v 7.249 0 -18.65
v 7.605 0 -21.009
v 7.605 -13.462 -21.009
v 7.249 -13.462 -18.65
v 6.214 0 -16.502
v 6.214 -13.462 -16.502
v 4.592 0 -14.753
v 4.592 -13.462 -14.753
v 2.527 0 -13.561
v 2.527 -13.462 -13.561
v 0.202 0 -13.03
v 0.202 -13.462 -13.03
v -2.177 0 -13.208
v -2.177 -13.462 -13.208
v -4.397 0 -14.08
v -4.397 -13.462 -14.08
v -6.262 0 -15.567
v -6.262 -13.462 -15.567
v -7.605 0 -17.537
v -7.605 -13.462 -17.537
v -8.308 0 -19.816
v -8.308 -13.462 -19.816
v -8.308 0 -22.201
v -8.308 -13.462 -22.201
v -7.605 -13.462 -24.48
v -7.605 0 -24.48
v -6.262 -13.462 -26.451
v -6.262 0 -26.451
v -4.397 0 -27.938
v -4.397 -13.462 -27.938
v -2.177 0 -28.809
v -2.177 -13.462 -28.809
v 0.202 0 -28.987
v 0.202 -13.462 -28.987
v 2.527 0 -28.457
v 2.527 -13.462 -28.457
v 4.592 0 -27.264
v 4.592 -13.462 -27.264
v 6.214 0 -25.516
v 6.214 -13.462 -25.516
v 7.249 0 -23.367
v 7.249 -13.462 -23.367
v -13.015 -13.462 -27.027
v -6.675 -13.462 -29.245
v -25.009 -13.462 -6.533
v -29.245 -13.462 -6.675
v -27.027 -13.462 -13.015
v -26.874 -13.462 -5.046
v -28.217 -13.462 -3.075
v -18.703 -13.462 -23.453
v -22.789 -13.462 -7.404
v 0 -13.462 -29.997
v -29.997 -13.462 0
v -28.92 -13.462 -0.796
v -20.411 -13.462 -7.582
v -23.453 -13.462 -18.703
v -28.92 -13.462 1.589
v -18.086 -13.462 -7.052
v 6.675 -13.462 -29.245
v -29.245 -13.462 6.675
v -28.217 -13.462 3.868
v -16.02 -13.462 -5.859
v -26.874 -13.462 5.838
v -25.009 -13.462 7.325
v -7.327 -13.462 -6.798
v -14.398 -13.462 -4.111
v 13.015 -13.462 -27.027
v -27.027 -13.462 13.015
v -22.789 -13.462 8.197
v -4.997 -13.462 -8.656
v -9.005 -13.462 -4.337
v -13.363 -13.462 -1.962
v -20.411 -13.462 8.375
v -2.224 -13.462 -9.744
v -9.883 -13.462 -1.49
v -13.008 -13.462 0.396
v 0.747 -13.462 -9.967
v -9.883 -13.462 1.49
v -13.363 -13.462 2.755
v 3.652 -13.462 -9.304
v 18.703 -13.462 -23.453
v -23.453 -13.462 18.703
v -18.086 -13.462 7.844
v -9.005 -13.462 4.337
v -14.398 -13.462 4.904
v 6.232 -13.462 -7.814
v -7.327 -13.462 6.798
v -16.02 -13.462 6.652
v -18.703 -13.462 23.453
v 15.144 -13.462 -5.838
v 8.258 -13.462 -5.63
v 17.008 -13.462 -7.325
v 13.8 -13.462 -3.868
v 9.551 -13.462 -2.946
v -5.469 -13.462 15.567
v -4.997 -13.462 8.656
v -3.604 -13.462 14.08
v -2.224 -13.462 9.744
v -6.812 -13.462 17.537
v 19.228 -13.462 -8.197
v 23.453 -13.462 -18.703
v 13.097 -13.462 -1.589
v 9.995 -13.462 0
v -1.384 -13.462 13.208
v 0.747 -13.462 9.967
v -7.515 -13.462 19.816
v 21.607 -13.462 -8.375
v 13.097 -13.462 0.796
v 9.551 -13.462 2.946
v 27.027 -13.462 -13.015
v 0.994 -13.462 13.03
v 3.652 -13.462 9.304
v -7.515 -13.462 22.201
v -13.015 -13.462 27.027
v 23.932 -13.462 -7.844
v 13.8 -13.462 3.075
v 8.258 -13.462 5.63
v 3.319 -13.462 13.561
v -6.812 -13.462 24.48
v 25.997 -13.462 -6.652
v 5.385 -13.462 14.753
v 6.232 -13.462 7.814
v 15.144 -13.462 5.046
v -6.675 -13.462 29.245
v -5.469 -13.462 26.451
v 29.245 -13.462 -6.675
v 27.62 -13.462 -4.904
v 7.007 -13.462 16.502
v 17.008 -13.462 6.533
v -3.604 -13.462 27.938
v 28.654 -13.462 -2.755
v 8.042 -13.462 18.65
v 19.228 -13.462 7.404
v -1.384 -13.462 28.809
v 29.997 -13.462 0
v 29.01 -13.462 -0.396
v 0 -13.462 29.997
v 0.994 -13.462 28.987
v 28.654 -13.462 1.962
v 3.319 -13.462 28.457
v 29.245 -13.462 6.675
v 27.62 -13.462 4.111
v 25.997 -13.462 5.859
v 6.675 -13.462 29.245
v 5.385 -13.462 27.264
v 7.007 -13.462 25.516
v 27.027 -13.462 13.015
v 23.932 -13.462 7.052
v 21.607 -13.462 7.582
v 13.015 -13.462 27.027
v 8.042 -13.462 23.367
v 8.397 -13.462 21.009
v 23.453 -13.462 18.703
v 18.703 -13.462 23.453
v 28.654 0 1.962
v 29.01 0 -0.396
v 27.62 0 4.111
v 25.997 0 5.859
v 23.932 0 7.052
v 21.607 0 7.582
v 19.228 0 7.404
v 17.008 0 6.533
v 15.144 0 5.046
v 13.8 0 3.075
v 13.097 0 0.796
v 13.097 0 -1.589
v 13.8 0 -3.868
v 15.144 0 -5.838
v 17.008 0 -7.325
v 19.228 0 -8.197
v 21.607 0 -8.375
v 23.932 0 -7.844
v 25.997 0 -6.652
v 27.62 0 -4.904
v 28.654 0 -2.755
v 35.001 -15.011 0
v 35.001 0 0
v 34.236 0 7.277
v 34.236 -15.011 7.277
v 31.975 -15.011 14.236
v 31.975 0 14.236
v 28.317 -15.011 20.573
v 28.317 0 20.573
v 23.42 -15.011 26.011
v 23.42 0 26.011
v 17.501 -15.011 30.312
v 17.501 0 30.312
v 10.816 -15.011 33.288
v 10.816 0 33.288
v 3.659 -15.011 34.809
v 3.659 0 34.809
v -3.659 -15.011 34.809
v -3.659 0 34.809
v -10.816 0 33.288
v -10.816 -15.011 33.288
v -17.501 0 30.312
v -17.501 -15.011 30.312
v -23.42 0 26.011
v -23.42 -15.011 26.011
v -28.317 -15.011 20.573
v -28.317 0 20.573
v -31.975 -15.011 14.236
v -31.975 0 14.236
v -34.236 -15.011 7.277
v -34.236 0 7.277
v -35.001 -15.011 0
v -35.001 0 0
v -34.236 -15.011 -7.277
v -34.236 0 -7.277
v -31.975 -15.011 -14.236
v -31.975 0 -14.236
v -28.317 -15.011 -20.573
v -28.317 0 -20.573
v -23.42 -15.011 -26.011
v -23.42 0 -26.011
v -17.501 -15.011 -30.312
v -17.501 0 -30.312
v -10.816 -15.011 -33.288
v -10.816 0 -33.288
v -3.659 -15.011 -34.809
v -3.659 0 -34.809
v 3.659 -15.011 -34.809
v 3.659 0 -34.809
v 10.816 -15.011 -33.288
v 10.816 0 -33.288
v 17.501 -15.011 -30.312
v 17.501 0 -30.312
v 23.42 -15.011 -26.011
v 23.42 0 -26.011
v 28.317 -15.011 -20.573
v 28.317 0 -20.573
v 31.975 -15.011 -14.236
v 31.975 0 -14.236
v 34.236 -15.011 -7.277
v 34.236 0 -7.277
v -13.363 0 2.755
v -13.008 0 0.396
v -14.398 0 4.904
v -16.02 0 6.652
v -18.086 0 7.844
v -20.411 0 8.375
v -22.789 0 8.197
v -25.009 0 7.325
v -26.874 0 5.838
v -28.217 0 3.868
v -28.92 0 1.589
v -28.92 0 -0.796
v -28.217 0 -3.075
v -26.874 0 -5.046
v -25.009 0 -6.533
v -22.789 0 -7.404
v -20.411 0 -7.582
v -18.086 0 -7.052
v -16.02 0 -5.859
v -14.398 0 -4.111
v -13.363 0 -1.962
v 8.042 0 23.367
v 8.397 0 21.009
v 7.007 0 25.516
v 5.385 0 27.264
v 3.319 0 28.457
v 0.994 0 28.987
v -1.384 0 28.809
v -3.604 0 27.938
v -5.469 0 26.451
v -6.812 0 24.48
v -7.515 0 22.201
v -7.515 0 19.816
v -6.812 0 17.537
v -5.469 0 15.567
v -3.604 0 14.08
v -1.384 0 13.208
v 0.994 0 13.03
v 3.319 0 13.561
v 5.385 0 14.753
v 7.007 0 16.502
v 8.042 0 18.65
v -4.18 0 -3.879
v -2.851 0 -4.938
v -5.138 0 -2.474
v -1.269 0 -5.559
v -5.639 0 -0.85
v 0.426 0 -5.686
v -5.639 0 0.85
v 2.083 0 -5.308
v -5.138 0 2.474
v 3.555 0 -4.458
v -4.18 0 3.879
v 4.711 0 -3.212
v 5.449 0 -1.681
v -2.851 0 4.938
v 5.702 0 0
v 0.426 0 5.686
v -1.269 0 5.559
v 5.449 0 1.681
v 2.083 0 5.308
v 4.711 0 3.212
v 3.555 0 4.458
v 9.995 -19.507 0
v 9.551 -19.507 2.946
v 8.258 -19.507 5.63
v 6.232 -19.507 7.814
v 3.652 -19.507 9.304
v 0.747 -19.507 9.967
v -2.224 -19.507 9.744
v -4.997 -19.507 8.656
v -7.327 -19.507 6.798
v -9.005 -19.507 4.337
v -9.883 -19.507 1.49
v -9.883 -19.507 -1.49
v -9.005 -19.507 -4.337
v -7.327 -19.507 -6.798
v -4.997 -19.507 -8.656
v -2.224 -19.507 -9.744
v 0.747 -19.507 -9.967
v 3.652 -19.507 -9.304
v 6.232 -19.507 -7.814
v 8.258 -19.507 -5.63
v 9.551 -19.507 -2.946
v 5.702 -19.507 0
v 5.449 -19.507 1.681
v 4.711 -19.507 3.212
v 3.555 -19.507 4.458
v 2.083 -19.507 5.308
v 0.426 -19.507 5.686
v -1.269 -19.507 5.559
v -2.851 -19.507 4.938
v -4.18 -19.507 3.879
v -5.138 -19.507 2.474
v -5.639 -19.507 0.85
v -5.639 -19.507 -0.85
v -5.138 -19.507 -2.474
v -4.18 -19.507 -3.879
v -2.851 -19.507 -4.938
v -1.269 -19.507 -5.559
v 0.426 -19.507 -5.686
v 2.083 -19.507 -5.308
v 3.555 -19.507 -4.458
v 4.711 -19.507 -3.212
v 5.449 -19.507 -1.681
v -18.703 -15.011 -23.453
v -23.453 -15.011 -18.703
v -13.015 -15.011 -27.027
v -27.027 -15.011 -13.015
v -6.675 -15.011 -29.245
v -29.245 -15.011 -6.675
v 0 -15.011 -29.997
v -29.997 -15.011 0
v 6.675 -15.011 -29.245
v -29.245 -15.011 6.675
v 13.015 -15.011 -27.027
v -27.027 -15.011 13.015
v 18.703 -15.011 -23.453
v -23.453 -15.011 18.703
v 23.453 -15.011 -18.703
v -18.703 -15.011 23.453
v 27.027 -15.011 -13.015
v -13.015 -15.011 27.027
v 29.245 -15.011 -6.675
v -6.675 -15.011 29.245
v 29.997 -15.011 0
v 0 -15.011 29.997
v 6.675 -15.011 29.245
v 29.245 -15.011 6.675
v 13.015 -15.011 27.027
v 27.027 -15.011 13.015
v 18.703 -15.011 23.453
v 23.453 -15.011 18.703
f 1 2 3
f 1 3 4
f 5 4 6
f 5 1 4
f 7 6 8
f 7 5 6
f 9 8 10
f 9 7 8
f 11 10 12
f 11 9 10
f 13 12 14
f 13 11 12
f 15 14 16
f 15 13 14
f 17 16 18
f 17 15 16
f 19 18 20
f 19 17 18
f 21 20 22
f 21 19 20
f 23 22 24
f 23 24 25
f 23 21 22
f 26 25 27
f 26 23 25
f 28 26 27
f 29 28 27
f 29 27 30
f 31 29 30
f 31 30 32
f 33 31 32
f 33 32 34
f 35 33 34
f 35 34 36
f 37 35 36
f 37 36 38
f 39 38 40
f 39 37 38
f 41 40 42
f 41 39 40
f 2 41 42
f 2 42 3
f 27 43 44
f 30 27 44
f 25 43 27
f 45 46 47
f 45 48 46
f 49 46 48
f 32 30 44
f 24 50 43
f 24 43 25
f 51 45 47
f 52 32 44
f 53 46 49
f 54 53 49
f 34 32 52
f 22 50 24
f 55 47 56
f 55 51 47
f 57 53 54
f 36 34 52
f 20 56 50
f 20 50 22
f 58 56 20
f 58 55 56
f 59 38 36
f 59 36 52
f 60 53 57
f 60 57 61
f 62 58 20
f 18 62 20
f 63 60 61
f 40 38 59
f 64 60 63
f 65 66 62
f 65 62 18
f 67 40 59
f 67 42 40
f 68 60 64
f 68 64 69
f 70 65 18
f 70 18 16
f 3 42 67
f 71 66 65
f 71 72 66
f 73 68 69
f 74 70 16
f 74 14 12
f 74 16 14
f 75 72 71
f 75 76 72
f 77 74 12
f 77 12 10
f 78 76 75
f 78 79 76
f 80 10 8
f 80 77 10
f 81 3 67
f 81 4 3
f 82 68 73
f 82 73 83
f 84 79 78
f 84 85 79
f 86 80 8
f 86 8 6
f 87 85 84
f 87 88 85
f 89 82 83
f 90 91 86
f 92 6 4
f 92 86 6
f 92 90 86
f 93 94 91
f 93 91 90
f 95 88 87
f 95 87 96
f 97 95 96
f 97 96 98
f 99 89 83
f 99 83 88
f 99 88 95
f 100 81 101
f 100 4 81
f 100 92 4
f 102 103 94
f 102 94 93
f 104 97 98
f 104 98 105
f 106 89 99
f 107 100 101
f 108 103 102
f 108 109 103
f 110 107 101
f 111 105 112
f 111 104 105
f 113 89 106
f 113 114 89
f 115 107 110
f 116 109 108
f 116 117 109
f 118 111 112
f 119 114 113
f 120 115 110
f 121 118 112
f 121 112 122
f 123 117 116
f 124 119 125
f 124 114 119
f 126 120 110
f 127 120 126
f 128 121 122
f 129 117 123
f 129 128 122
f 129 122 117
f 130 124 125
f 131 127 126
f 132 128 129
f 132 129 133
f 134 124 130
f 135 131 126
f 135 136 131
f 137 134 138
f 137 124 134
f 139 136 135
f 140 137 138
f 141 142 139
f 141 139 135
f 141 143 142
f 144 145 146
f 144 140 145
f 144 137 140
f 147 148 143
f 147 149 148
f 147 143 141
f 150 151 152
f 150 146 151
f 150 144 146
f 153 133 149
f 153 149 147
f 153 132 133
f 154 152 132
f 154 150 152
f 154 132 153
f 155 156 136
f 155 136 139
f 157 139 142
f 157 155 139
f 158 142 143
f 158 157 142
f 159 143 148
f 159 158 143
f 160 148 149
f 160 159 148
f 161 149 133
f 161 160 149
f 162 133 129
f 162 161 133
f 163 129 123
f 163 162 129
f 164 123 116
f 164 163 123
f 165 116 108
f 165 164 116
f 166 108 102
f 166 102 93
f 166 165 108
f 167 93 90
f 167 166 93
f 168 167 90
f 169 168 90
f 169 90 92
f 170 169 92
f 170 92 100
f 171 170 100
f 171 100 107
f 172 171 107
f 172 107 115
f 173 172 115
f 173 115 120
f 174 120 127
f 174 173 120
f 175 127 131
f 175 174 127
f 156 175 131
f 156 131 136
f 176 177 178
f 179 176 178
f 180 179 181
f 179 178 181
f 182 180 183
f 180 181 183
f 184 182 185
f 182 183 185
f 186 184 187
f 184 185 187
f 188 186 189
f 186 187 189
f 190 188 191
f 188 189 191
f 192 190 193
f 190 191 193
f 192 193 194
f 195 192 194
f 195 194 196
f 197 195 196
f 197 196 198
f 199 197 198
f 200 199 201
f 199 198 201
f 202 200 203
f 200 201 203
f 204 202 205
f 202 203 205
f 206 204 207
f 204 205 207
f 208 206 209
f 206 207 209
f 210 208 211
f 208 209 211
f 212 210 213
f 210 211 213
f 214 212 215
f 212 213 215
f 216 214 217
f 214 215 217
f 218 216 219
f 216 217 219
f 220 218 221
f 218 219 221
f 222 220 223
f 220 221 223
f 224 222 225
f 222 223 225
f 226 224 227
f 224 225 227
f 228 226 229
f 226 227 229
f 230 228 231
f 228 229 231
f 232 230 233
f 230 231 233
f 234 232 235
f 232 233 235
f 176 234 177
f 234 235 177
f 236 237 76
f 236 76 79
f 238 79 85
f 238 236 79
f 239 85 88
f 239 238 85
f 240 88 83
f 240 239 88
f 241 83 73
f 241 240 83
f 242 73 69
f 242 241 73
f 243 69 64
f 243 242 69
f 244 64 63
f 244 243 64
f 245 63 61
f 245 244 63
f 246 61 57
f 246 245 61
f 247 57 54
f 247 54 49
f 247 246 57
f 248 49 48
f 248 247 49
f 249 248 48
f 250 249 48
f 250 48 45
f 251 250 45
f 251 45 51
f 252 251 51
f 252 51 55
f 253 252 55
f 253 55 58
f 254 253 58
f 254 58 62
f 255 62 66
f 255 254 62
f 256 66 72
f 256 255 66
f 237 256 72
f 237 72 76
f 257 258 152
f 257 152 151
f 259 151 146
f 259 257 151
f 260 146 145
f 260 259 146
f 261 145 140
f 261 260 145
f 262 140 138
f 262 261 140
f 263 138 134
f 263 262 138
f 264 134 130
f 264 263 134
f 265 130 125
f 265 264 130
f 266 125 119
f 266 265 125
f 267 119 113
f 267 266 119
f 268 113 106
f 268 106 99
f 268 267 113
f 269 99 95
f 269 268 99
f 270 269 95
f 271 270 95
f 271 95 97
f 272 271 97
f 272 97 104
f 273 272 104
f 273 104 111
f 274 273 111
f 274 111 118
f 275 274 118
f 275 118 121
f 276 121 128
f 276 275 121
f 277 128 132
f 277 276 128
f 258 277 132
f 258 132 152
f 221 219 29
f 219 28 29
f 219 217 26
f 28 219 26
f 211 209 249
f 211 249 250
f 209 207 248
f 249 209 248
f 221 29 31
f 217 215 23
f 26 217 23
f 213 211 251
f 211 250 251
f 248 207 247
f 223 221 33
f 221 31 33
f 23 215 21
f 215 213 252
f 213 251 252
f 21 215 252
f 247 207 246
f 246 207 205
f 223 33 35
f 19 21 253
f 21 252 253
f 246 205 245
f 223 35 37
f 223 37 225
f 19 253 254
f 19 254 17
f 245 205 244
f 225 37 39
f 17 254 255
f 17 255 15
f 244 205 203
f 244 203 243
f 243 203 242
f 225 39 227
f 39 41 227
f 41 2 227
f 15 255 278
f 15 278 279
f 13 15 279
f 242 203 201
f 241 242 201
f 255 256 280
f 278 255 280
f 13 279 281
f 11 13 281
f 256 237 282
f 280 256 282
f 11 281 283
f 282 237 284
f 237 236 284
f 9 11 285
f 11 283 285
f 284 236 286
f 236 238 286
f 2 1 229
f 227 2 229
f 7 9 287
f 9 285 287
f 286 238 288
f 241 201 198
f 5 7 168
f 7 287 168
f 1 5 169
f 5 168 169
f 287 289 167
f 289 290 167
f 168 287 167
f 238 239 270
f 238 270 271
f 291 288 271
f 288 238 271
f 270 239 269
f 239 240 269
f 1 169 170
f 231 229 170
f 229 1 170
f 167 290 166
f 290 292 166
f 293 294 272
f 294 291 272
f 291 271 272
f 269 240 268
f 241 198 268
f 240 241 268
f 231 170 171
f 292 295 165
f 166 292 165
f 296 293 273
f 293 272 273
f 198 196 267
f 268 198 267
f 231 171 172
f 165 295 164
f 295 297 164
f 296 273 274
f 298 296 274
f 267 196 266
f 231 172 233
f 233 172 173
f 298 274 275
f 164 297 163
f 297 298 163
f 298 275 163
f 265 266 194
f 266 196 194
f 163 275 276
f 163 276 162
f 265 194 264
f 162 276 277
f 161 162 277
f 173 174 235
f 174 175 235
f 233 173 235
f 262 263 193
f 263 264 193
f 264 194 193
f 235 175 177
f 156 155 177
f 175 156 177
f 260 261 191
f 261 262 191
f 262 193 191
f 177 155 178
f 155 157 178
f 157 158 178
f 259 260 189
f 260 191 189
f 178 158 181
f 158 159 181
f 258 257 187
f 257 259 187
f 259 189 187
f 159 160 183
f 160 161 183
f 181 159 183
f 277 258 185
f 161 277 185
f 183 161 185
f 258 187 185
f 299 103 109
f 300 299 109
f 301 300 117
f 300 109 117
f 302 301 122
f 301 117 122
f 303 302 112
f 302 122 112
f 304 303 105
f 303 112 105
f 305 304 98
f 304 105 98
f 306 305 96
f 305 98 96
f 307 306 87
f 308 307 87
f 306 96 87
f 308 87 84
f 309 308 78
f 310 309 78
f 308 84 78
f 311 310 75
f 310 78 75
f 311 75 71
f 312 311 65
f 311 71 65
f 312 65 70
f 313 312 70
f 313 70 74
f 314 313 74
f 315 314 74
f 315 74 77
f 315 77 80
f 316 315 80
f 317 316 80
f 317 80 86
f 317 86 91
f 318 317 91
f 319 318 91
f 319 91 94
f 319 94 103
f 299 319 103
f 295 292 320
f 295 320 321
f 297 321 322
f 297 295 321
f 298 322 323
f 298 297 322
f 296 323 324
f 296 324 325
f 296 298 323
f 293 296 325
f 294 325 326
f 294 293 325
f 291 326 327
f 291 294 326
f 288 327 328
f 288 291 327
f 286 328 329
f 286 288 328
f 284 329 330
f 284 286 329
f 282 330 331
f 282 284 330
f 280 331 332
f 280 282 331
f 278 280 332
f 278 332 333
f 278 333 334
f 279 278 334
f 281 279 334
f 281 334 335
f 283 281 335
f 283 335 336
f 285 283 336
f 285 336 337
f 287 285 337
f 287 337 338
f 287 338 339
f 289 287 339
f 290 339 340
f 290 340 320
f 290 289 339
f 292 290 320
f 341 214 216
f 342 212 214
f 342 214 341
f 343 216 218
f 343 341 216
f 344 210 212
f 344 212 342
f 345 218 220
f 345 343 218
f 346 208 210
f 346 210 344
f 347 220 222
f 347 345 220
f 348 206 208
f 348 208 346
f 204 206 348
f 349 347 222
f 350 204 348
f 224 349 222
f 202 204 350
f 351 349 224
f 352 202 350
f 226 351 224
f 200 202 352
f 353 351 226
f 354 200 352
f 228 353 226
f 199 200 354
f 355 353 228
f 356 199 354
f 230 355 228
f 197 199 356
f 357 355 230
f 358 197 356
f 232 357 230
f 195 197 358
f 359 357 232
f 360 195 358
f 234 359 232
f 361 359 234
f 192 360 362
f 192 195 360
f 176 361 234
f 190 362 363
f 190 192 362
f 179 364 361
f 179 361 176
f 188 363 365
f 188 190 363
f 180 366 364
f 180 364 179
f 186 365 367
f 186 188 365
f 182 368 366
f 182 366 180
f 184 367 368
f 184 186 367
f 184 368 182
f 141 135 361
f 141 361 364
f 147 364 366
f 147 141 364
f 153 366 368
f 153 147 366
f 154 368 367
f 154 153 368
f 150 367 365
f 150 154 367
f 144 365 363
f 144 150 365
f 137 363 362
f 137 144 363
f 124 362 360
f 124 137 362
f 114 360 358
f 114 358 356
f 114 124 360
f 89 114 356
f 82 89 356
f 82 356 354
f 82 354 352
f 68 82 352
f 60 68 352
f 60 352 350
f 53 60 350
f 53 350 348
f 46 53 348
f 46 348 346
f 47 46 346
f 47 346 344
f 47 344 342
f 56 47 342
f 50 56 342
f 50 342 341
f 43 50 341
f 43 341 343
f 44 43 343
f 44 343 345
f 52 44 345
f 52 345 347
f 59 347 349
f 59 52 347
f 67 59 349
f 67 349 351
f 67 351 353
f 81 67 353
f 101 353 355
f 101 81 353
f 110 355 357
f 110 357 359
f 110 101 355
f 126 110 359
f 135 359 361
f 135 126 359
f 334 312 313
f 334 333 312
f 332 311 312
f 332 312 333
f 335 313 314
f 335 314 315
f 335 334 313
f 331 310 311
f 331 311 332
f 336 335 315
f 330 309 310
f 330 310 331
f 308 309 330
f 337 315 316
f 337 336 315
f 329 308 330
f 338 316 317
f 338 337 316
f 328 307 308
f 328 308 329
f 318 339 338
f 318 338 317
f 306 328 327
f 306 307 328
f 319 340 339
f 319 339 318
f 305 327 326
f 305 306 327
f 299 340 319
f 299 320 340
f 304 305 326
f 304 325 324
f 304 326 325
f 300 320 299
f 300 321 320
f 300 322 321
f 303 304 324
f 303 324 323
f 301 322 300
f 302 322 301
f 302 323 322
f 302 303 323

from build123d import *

# Parameters (mm, degrees)
F0_R     = 9.9949
F0_R_2   = 5.7023
F1_DEPTH = 19.5072
F0_R_3   = 29.9974
F0_R_4   = 8.001
F2_DEPTH = 13.462
F0_R_5   = 35.0012
F3_DEPTH = 15.0114


with BuildPart() as f1:
    # F0 (on Front) → F1 (new body)
    with BuildSketch(Plane.XZ):
        Circle(F0_R)
        Circle(F0_R_2, mode=Mode.SUBTRACT)
    extrude(amount=F1_DEPTH)

    # F0 (on Front) → F2 (join)
    with BuildSketch(Plane.XZ):
        Circle(F0_R_3)
        with Locations((-0.396391, -21.008808)):
            Circle(F0_R_4, mode=Mode.SUBTRACT)
        with Locations((21.008808, -0.396391)):
            Circle(F0_R_4, mode=Mode.SUBTRACT)
        with Locations((-21.008808, 0.396391)):
            Circle(F0_R_4, mode=Mode.SUBTRACT)
        Circle(F0_R, mode=Mode.SUBTRACT)
        with Locations((0.396391, 21.008808)):
            Circle(F0_R_4, mode=Mode.SUBTRACT)
    extrude(amount=F2_DEPTH)

    # F0 (on Front) → F3 (join)
    with BuildSketch(Plane.XZ):
        Circle(F0_R_5)
        Circle(F0_R_3, mode=Mode.SUBTRACT)
    extrude(amount=F3_DEPTH)


solid = f1.part
